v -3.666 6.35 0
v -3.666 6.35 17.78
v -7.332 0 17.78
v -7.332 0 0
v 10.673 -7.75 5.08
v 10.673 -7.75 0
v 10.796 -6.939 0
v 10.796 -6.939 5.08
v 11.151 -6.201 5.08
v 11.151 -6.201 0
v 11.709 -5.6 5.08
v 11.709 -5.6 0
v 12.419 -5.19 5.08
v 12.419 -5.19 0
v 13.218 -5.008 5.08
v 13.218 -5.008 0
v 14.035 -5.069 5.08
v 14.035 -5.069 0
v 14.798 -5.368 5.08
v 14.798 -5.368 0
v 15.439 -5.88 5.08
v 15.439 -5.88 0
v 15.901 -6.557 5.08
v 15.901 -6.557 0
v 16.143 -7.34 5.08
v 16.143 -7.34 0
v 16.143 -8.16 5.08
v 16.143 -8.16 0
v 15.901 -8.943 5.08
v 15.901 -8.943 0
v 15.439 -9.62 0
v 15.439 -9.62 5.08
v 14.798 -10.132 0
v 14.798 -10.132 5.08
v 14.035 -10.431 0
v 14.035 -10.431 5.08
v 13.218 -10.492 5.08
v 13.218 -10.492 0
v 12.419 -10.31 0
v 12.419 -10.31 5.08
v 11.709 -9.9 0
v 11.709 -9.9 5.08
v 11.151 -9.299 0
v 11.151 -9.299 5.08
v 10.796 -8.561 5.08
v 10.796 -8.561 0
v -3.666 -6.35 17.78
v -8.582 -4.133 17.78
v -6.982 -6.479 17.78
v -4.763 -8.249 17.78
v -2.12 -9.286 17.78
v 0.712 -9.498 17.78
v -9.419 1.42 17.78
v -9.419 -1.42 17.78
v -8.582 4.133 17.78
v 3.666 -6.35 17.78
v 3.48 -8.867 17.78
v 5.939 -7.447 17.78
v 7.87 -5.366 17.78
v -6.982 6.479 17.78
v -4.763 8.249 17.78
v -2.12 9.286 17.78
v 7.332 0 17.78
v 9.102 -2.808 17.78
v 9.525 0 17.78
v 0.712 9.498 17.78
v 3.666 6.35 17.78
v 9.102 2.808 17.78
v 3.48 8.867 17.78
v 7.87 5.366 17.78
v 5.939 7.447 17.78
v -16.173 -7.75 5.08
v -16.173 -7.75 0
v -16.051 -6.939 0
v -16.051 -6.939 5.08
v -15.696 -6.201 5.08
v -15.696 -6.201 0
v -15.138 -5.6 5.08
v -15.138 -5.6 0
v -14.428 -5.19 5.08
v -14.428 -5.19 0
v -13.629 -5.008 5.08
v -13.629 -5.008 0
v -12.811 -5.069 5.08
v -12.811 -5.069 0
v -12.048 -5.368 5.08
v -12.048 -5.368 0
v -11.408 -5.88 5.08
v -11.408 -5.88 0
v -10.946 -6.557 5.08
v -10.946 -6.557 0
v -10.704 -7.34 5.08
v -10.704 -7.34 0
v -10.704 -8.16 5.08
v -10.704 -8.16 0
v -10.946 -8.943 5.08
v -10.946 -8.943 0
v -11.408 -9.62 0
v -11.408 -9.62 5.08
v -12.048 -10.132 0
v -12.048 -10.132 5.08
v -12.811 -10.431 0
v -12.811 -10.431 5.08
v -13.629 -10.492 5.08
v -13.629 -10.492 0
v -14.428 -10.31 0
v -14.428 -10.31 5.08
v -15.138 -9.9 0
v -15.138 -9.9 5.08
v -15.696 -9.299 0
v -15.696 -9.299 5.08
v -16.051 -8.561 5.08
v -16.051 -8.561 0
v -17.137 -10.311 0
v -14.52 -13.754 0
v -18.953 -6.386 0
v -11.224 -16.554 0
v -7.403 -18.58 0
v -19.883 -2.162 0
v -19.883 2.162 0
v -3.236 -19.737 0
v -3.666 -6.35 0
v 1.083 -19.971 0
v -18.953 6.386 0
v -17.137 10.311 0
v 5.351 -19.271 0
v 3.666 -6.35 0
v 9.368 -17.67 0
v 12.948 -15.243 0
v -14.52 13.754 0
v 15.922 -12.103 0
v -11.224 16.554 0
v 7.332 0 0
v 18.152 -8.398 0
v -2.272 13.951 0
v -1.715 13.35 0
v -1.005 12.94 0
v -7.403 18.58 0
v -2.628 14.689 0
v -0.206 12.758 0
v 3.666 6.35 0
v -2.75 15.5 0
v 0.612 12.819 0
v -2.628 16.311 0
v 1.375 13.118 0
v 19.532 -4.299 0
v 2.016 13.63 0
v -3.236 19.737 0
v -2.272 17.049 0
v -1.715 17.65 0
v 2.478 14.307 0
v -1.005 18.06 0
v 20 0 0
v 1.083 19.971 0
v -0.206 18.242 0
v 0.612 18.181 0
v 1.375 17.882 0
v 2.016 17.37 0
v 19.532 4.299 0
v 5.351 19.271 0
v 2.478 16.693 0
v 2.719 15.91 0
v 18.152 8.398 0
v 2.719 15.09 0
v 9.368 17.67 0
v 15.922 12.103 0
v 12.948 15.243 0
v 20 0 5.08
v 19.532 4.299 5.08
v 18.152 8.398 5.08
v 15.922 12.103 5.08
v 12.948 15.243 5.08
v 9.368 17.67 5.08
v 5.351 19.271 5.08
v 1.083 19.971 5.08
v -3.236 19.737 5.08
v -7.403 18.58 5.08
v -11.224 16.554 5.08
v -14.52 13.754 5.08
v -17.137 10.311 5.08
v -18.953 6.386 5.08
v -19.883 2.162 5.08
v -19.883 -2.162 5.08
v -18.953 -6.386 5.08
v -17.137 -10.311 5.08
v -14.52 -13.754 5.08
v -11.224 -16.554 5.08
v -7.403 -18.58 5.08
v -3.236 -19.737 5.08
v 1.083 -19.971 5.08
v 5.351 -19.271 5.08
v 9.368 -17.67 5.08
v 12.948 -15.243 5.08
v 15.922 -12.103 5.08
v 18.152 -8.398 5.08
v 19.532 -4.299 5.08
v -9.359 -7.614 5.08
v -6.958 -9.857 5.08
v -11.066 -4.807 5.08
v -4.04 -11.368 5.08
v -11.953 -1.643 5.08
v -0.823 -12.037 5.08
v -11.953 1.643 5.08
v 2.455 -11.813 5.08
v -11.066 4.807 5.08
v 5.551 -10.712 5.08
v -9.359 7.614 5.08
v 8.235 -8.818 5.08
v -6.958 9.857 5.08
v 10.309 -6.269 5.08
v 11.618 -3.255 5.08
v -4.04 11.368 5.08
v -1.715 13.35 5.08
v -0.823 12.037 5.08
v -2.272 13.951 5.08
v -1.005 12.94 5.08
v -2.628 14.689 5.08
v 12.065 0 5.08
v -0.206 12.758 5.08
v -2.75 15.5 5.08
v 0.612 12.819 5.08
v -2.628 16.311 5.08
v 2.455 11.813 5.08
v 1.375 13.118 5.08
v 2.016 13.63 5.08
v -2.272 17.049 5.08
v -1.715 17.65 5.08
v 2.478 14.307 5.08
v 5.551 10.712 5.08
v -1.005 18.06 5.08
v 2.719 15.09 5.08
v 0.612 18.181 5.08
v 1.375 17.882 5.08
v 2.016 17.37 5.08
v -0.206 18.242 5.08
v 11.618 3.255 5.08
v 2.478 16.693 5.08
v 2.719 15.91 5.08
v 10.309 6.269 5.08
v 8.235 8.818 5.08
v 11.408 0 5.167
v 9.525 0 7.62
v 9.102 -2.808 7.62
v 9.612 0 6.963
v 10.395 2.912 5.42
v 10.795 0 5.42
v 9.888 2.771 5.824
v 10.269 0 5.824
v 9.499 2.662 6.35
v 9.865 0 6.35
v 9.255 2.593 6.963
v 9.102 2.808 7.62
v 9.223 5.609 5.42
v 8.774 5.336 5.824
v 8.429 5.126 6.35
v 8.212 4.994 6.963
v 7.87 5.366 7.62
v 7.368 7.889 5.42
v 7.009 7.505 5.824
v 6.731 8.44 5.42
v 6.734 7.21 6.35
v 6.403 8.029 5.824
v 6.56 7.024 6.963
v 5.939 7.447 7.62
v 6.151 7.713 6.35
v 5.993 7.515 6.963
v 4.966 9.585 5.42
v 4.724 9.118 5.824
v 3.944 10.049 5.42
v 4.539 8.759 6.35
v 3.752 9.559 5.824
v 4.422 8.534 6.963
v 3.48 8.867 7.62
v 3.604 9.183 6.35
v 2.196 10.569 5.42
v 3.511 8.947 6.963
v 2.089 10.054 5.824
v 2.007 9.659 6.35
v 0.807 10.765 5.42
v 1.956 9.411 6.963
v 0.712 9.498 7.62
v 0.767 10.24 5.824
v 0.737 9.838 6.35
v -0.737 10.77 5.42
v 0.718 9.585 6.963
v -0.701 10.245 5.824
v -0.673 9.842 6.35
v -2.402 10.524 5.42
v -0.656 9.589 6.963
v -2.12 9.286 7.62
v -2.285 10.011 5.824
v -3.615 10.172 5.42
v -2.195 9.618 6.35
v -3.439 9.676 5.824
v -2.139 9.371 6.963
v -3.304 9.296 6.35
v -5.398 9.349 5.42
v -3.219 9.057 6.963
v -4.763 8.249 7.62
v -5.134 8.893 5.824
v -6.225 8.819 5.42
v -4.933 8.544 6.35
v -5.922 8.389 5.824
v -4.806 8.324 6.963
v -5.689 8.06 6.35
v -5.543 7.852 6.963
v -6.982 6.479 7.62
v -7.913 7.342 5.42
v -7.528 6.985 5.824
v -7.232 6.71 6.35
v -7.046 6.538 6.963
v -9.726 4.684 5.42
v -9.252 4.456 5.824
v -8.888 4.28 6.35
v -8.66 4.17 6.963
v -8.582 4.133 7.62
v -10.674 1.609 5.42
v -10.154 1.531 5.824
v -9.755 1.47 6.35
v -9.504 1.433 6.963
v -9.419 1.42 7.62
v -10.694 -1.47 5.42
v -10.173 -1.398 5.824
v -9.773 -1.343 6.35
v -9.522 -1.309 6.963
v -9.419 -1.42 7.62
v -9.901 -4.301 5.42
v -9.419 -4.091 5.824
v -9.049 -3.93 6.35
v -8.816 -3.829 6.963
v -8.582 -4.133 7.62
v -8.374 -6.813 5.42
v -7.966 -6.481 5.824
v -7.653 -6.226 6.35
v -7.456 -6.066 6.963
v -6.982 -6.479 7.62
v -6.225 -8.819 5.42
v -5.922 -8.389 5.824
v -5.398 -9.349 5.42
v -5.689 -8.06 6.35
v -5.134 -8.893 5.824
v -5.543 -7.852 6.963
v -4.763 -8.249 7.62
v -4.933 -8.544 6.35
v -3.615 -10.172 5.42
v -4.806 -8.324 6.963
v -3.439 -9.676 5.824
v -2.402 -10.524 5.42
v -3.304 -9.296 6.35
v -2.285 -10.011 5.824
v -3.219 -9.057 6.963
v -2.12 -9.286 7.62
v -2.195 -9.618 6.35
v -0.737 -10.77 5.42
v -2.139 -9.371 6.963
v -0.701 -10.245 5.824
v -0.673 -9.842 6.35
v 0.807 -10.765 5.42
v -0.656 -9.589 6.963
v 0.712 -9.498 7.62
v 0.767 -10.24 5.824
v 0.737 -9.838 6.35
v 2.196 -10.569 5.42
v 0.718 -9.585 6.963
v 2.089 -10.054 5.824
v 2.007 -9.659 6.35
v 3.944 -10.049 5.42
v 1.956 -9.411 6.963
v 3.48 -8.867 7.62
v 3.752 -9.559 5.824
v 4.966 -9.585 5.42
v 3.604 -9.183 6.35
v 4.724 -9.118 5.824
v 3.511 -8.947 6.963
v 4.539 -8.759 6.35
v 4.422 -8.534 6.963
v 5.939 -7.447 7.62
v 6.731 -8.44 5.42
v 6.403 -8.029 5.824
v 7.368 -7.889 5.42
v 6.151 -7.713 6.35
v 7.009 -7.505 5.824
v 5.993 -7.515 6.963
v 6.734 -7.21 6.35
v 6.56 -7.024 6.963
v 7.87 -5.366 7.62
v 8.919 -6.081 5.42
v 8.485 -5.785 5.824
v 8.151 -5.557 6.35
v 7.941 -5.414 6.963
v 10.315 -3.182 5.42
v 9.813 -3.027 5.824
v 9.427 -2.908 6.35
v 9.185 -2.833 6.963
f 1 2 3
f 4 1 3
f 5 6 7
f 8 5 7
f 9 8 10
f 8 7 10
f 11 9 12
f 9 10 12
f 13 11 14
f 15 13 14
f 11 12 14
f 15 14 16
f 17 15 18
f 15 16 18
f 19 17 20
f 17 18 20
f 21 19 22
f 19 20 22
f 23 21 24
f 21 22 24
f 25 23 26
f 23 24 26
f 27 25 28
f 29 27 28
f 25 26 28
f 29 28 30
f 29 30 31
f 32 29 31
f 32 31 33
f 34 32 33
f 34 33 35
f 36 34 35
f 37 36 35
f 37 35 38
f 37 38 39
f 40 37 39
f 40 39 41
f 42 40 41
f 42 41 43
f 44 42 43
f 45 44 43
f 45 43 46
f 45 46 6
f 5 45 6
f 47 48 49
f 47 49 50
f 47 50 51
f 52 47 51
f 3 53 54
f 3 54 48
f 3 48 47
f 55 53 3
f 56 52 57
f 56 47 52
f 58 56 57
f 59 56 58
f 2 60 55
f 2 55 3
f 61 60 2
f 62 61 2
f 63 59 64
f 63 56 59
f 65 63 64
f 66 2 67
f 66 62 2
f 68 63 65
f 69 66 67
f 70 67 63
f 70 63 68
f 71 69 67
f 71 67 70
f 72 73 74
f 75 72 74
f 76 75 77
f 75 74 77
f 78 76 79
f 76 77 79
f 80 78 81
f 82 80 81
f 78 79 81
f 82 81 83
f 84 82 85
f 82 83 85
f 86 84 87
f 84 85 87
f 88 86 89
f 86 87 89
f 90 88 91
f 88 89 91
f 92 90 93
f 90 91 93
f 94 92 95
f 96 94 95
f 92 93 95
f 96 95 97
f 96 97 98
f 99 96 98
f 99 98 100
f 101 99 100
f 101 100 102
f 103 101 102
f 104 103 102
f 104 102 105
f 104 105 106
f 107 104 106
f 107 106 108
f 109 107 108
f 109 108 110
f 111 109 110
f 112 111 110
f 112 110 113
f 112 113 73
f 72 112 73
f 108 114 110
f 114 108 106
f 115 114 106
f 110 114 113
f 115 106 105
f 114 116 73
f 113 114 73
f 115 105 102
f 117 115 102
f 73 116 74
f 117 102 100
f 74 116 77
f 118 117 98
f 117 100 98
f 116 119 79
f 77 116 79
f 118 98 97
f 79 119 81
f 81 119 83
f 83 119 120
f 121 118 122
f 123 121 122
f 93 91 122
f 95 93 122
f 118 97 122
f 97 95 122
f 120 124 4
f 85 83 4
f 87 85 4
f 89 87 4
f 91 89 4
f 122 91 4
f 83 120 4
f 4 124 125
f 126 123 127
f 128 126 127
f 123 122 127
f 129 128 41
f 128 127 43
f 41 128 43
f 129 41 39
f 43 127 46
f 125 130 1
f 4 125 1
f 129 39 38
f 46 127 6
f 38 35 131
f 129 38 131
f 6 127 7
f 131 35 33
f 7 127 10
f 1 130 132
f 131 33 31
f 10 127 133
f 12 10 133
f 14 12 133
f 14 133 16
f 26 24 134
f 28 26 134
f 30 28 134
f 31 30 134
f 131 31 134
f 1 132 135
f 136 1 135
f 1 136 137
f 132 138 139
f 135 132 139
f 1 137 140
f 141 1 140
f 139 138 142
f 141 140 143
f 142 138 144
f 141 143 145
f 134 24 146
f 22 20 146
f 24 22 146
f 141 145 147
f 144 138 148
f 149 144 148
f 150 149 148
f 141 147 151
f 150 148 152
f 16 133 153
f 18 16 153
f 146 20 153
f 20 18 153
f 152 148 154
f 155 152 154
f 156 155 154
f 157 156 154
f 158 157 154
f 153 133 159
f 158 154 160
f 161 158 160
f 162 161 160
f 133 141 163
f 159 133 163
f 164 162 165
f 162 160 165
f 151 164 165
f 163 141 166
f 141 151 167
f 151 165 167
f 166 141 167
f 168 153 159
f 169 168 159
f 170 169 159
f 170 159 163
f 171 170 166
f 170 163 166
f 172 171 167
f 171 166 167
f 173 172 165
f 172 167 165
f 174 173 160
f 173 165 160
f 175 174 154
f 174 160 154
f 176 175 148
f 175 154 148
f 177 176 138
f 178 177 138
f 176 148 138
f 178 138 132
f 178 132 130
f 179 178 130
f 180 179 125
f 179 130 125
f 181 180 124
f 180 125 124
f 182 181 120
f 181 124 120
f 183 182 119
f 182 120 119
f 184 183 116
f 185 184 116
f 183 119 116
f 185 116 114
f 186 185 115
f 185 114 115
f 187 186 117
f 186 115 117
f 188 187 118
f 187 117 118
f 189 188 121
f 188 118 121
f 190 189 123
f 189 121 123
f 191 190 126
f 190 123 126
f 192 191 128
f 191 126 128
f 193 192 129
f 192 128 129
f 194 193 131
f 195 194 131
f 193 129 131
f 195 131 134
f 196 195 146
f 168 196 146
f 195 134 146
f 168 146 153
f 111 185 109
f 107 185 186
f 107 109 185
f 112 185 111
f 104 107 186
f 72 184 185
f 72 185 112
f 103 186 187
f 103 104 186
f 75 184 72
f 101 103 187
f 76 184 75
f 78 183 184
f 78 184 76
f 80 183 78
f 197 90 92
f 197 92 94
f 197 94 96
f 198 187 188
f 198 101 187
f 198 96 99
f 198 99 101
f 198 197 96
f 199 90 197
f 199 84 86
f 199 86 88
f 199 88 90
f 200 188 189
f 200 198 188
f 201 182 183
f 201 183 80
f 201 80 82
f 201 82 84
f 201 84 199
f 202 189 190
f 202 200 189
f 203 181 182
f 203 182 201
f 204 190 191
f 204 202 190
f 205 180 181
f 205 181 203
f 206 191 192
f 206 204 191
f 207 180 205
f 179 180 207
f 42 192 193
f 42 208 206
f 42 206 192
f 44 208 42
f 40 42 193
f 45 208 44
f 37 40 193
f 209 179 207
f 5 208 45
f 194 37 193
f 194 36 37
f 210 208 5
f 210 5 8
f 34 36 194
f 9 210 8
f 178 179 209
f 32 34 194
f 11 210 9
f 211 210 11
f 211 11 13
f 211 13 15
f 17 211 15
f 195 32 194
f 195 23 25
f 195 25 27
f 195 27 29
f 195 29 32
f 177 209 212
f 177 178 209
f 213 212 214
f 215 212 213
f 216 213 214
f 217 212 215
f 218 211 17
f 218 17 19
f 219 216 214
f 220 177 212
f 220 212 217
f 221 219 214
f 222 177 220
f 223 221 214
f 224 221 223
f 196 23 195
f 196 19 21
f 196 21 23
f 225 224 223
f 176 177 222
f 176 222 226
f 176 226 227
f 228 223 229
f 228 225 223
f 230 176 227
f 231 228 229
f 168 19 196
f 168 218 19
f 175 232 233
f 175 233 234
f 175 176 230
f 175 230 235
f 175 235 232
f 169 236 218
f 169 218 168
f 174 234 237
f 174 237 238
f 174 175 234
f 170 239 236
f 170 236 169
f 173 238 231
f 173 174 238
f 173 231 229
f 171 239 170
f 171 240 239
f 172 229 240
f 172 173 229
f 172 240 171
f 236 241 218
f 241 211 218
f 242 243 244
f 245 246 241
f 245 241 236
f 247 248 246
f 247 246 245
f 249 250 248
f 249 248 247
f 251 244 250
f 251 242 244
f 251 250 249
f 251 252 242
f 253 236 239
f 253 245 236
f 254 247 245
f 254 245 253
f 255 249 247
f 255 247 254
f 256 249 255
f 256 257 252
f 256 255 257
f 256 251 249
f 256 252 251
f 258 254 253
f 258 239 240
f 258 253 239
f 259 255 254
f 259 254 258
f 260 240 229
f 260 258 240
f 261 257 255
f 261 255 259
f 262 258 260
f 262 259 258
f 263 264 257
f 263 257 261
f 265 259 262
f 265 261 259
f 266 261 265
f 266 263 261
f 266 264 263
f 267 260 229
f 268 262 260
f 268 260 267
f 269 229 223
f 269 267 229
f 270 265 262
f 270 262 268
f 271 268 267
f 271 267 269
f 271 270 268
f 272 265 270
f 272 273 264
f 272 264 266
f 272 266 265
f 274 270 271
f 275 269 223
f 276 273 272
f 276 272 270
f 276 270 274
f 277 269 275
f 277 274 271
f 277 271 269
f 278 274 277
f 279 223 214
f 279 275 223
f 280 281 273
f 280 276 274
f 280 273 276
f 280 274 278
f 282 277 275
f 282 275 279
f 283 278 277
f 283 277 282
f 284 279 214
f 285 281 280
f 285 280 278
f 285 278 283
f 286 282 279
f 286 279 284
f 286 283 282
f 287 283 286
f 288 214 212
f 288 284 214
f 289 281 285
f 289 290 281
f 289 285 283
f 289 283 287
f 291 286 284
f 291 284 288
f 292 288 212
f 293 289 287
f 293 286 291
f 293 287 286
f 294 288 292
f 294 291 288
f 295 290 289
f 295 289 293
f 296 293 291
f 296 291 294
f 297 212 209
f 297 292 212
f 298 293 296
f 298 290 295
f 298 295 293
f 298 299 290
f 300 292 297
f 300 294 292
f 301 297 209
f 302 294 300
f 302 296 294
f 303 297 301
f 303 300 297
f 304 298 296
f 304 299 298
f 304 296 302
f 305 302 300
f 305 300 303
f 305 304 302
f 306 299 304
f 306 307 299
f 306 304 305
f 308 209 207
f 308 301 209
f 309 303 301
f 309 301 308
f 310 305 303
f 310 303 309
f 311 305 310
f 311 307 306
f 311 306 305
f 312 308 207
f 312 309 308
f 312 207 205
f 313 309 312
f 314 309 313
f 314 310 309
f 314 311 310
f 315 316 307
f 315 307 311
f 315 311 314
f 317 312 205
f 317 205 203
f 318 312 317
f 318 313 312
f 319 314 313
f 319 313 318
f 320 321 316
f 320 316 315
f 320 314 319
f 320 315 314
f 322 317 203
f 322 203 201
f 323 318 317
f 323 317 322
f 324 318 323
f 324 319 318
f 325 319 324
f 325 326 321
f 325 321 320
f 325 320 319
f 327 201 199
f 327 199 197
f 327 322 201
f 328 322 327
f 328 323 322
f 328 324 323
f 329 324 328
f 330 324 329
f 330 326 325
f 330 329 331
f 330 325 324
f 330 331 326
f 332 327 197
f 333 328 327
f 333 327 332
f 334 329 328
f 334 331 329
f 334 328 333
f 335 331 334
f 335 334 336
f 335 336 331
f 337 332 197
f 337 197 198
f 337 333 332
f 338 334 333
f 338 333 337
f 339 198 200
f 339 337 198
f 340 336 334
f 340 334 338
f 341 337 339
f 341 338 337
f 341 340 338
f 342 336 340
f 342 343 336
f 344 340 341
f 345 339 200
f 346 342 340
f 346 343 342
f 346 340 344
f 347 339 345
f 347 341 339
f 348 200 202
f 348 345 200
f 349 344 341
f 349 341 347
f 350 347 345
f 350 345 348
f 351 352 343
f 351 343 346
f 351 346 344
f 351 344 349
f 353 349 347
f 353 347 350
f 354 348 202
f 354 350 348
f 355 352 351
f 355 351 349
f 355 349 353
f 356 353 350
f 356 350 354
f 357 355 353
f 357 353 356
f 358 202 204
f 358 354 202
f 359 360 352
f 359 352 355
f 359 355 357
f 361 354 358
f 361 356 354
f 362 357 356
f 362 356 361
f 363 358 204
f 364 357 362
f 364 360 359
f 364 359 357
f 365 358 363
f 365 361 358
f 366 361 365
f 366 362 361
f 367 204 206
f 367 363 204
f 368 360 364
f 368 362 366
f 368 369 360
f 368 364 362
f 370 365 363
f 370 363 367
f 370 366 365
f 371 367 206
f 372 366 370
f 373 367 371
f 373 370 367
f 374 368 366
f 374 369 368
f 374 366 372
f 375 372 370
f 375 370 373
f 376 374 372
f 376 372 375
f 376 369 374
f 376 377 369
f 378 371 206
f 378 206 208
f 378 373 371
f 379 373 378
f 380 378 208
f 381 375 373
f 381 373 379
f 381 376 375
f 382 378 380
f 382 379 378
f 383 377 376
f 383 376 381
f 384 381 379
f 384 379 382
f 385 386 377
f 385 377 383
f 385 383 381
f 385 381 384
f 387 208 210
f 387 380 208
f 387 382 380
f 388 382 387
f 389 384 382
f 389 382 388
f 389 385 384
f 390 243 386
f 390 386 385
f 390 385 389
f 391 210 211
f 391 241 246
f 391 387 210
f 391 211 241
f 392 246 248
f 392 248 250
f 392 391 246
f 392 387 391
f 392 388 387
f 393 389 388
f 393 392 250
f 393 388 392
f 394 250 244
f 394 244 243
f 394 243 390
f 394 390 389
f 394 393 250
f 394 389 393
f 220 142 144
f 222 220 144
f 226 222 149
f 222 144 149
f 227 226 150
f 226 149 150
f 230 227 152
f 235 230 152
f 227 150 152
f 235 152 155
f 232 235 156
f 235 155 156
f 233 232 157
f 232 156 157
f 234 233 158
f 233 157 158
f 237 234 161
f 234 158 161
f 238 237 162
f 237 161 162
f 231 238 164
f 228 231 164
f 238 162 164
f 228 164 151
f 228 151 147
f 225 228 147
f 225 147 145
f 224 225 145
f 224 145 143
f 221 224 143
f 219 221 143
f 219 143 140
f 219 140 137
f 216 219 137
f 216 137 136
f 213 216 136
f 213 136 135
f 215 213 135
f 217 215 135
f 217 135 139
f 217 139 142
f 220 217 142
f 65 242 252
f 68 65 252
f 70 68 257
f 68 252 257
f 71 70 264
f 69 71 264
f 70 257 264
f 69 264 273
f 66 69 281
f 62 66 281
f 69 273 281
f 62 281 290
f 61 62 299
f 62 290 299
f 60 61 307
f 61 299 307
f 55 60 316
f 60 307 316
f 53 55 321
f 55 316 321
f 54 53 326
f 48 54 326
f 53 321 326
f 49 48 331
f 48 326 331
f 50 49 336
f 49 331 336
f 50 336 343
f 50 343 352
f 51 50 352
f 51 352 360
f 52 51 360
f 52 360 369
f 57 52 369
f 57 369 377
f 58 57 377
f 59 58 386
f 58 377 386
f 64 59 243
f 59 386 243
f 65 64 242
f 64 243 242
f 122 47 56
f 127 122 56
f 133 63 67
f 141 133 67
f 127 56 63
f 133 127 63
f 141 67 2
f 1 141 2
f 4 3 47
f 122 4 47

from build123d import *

# Parameters (mm, degrees)
SKETCH1_R            = 20
BOSS_EXTRUDE1_DEPTH  = 5.08
SKETCH2_R            = 9.525
BOSS_EXTRUDE2_DEPTH  = 12.7
M5_CLEARANCE_HOLE1_D = 5.5
CUT_EXTRUDE1_DEPTH   = 18.78
FILLET1_R            = 2.54


with BuildPart() as part:
    # Sketch1 → Boss-Extrude1 (new body)
    with BuildSketch(Plane.XY):
        Circle(SKETCH1_R)
    extrude(amount=BOSS_EXTRUDE1_DEPTH)

    # Sketch2 → Boss-Extrude2 (add)
    with BuildSketch(Plane.XY.offset(5.08)):
        Circle(SKETCH2_R)
    extrude(amount=BOSS_EXTRUDE2_DEPTH)

    # M5 Clearance Hole1 (through all)
    with Locations(Plane.XY.offset(5.08)):
        with Locations((0, 15.5), (13.423393759, -7.75), (-13.423393759, -7.75)):
            Hole(M5_CLEARANCE_HOLE1_D / 2)

    # Sketch5 → Cut-Extrude1 (cut, through all)
    with BuildSketch(Plane.XY.offset(17.78)):
        Polygon((3.666174209, 6.35), (-3.666174209, 6.35), (-7.332348419, 0), (-3.666174209, -6.35), (3.666174209, -6.35), (7.332348419, 0), align=None)
    extrude(amount=-CUT_EXTRUDE1_DEPTH, mode=Mode.SUBTRACT)

    # Fillet1
    fillet1_edges = [part.edges().sort_by_distance(p)[0] for p in [
        (-9.525, 0, 5.08),
    ]]
    fillet(fillet1_edges, radius=FILLET1_R)


solid = part.part
